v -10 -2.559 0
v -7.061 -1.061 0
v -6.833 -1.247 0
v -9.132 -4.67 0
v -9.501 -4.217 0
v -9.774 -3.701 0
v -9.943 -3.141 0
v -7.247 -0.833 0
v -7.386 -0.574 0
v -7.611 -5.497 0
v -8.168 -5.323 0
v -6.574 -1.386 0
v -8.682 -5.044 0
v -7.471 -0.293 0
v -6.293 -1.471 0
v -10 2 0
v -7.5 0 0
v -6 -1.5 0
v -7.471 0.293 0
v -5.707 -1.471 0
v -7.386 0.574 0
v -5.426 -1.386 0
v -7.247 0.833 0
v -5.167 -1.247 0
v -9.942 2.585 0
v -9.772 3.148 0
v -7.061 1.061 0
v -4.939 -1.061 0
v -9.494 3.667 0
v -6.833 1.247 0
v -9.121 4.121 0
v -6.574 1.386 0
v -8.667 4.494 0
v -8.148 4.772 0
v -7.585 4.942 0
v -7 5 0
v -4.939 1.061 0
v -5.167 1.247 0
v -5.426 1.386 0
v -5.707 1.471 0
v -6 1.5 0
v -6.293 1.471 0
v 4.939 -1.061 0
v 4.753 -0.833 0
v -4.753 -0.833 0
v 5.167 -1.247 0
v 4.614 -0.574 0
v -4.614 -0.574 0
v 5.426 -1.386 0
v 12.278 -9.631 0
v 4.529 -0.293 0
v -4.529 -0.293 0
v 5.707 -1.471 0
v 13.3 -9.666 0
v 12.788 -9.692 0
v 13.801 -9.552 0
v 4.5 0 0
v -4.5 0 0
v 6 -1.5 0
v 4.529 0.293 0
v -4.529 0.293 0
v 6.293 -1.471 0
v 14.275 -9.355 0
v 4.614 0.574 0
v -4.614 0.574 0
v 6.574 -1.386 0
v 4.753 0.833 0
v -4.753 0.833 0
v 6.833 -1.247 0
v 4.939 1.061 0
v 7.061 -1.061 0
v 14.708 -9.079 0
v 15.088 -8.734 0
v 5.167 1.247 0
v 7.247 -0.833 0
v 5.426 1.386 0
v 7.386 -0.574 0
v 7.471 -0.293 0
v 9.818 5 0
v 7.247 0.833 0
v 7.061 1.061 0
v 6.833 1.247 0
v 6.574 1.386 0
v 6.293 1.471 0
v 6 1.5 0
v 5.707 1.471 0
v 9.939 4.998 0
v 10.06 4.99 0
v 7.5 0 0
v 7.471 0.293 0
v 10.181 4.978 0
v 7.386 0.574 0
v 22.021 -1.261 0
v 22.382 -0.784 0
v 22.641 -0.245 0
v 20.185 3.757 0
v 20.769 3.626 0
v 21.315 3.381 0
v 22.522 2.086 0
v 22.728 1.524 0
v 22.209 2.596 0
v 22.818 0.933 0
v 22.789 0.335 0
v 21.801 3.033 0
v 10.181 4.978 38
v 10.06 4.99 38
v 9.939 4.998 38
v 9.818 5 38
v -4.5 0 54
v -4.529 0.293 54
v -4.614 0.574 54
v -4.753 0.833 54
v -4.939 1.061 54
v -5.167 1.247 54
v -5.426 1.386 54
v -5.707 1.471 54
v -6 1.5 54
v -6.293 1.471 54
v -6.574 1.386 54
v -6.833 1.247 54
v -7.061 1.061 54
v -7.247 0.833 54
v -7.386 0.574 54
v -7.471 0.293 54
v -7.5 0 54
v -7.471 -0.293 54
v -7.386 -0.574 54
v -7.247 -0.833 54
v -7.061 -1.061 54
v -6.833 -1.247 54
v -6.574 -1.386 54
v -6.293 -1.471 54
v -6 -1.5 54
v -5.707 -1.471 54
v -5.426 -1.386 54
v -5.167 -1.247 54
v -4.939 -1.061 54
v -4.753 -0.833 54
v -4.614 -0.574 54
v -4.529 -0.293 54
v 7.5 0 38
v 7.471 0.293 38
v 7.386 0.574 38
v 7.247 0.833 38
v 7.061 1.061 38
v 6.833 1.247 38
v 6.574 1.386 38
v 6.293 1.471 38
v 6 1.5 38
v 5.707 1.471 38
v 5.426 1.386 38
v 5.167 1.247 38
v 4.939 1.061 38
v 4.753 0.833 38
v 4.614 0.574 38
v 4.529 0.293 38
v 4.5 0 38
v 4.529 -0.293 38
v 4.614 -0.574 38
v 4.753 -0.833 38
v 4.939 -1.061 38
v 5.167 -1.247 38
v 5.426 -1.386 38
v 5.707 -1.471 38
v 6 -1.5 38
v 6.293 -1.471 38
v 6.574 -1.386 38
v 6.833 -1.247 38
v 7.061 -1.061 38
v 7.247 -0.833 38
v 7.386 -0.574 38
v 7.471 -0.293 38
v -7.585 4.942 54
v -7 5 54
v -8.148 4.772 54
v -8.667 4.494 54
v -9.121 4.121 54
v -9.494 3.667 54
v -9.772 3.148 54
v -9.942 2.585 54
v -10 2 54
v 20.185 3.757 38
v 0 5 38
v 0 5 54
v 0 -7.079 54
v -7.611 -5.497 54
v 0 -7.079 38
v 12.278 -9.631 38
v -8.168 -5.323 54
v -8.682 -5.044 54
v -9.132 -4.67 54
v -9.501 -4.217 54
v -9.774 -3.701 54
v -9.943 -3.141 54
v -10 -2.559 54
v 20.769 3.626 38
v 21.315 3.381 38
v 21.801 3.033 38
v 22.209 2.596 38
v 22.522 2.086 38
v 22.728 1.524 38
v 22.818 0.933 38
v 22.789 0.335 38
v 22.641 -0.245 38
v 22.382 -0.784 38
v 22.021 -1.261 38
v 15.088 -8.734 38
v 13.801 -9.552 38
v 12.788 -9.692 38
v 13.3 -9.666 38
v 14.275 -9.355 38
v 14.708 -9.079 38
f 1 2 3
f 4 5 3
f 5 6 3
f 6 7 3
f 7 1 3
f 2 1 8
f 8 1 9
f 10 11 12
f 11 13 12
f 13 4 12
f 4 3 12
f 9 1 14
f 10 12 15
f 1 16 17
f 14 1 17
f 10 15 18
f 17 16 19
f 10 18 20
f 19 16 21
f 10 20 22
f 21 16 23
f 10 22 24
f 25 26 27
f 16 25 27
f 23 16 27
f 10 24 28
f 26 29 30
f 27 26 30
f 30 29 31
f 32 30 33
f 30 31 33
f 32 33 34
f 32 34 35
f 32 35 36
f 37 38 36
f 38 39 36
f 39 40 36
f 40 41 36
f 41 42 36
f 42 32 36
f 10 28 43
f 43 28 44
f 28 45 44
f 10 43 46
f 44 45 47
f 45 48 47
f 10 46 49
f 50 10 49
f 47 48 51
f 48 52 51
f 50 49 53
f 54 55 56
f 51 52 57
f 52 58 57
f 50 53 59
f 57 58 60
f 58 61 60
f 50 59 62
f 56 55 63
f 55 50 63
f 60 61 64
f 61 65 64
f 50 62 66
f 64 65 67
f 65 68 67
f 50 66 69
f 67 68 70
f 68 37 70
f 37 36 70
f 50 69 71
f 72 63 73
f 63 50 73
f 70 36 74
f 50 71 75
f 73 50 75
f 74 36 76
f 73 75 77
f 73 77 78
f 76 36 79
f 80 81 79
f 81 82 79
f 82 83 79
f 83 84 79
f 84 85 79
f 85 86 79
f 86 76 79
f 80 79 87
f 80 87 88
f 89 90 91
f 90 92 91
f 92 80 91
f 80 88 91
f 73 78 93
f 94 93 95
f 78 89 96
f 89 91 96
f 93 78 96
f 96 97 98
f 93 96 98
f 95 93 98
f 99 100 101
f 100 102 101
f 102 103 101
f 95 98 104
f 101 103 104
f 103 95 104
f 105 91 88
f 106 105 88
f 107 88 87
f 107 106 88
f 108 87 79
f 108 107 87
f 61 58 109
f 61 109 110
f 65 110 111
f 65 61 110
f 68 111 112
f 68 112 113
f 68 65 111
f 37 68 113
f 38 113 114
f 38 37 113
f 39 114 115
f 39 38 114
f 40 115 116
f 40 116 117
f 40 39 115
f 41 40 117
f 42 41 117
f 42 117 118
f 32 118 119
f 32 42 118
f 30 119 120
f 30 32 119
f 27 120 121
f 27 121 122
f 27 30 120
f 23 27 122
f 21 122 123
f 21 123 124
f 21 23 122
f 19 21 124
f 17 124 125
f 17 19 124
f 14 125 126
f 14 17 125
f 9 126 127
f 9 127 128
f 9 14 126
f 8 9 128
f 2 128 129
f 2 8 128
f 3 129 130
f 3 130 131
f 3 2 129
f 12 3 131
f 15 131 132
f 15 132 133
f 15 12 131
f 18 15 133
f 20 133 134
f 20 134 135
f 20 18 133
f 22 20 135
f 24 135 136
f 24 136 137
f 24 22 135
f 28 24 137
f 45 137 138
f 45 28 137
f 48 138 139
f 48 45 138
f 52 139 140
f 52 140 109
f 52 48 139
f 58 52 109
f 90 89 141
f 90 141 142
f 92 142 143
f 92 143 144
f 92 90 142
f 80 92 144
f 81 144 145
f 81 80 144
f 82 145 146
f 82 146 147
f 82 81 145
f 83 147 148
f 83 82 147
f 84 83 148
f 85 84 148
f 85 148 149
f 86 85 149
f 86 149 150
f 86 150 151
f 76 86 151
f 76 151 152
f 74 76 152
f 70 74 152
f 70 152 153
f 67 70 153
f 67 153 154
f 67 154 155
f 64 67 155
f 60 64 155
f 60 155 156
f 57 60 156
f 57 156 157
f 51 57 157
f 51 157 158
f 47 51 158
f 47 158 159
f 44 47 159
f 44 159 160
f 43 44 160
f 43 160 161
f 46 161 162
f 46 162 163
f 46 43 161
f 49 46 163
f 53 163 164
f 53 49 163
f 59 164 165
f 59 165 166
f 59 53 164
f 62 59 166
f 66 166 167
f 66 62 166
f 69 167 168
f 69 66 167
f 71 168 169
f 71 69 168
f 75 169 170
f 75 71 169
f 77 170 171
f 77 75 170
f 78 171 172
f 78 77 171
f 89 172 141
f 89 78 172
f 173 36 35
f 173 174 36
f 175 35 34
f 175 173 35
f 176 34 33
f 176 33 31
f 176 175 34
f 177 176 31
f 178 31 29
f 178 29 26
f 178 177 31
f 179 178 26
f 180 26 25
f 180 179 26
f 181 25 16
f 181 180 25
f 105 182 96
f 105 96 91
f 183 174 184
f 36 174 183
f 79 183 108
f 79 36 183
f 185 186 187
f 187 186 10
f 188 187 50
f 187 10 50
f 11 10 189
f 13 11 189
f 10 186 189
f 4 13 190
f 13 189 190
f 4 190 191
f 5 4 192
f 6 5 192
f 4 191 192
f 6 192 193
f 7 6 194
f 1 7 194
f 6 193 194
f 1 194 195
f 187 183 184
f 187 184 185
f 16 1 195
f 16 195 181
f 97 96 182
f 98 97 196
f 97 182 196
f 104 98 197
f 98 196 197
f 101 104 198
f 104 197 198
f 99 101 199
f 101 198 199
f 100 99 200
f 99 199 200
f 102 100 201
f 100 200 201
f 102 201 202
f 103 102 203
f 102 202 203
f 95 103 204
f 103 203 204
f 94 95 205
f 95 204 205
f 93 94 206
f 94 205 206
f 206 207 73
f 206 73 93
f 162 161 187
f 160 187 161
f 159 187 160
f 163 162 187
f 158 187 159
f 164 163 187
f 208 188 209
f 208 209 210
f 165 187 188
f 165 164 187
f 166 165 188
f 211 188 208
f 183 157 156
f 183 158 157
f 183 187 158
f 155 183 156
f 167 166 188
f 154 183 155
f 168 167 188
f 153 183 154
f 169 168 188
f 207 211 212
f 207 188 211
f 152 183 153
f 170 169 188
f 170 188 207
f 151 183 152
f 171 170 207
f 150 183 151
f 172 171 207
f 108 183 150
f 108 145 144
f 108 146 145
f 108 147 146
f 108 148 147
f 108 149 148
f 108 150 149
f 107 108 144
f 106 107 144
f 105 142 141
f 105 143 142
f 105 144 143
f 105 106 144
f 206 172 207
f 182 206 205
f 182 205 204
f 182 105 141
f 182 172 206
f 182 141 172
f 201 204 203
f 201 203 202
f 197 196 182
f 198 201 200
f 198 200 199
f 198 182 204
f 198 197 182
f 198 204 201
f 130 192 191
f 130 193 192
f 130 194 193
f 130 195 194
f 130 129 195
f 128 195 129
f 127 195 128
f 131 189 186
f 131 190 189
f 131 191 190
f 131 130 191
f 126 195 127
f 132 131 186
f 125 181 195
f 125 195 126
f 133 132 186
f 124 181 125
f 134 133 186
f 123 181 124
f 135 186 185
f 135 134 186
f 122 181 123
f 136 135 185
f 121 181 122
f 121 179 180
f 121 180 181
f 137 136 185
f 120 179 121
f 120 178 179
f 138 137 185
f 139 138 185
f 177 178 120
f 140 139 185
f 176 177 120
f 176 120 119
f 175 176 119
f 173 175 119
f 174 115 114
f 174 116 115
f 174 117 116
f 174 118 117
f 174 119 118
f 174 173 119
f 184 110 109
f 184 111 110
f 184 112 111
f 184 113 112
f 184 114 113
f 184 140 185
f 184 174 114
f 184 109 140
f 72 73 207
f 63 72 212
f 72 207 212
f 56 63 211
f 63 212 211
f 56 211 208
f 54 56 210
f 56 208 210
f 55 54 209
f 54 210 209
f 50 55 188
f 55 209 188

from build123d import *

# Parameters (mm, degrees)
SKETCH_1_W          = 20
SKETCH_1_H          = 10
SKETCH_1_R          = 1.5
EXTRUDE_1_DEPTH     = 54
EXTRUDE_2_DEPTH     = 54
FILLET_1_R          = 3
SKETCH_4_R          = 1.5
CUT_EXTRUDE_2_DEPTH = 16


with BuildPart() as part:
    # 草图1 → 凸台-拉伸1 (new body)
    with BuildSketch(Plane.XY):
        Rectangle(SKETCH_1_W, SKETCH_1_H)
        with Locations((-6, 0)):
            Circle(SKETCH_1_R, mode=Mode.SUBTRACT)
        with Locations((6, 0)):
            Circle(SKETCH_1_R, mode=Mode.SUBTRACT)
    extrude(amount=EXTRUDE_1_DEPTH)

    # 草图2 → 凸台-拉伸2 (add)
    with BuildSketch(Plane(origin=(0, 0, 0), x_dir=(-1, 0, 0), z_dir=(0, 0, -1))):
        Polygon((-26.016199375, 3.045755137), (-10, 5), (-10, -5), (10, -5), (-13.936339886, -9.975800078), align=None)
    extrude(amount=-EXTRUDE_2_DEPTH)

    # 圆角1
    fillet_1_edges = [part.edges().sort_by_distance(p)[0] for p in [
        (26.016199375, 3.045755137, 27),
        (13.936339886, -9.975800078, 27),
        (-10, -5, 27),
        (-10, 5, 27),
        (10, 5, 27),
    ]]
    fillet(fillet_1_edges, radius=FILLET_1_R)

    # 草图4 → 切除-拉伸2 (cut)
    with BuildSketch(Plane.XY.offset(54)):
        with BuildLine():
            Line((9.817651049, 5), (0, 5))
            Line((0, 5), (0, -7.078763964))
            Line((0, -7.078763964), (12.278210403, -9.631114097))
            ThreePointArc((12.278210403, -9.631114097), (13.801017817, -9.551847513), (15.088142689, -8.734207508))
            Line((15.088142689, -8.734207508), (22.02094679, -1.260950763))
            ThreePointArc((22.02094679, -1.260950763), (22.638947239, 1.810129636), (20.184946376, 3.757265774))
            Line((20.184946376, 3.757265774), (10.181006508, 4.977914171))
            ThreePointArc((10.181006508, 4.977914171), (9.99966408, 4.994473452), (9.817651049, 5))
        make_face()
        with Locations((6, 0)):
            Circle(SKETCH_4_R, mode=Mode.SUBTRACT)
    extrude(amount=-CUT_EXTRUDE_2_DEPTH, mode=Mode.SUBTRACT)


solid = part.part
